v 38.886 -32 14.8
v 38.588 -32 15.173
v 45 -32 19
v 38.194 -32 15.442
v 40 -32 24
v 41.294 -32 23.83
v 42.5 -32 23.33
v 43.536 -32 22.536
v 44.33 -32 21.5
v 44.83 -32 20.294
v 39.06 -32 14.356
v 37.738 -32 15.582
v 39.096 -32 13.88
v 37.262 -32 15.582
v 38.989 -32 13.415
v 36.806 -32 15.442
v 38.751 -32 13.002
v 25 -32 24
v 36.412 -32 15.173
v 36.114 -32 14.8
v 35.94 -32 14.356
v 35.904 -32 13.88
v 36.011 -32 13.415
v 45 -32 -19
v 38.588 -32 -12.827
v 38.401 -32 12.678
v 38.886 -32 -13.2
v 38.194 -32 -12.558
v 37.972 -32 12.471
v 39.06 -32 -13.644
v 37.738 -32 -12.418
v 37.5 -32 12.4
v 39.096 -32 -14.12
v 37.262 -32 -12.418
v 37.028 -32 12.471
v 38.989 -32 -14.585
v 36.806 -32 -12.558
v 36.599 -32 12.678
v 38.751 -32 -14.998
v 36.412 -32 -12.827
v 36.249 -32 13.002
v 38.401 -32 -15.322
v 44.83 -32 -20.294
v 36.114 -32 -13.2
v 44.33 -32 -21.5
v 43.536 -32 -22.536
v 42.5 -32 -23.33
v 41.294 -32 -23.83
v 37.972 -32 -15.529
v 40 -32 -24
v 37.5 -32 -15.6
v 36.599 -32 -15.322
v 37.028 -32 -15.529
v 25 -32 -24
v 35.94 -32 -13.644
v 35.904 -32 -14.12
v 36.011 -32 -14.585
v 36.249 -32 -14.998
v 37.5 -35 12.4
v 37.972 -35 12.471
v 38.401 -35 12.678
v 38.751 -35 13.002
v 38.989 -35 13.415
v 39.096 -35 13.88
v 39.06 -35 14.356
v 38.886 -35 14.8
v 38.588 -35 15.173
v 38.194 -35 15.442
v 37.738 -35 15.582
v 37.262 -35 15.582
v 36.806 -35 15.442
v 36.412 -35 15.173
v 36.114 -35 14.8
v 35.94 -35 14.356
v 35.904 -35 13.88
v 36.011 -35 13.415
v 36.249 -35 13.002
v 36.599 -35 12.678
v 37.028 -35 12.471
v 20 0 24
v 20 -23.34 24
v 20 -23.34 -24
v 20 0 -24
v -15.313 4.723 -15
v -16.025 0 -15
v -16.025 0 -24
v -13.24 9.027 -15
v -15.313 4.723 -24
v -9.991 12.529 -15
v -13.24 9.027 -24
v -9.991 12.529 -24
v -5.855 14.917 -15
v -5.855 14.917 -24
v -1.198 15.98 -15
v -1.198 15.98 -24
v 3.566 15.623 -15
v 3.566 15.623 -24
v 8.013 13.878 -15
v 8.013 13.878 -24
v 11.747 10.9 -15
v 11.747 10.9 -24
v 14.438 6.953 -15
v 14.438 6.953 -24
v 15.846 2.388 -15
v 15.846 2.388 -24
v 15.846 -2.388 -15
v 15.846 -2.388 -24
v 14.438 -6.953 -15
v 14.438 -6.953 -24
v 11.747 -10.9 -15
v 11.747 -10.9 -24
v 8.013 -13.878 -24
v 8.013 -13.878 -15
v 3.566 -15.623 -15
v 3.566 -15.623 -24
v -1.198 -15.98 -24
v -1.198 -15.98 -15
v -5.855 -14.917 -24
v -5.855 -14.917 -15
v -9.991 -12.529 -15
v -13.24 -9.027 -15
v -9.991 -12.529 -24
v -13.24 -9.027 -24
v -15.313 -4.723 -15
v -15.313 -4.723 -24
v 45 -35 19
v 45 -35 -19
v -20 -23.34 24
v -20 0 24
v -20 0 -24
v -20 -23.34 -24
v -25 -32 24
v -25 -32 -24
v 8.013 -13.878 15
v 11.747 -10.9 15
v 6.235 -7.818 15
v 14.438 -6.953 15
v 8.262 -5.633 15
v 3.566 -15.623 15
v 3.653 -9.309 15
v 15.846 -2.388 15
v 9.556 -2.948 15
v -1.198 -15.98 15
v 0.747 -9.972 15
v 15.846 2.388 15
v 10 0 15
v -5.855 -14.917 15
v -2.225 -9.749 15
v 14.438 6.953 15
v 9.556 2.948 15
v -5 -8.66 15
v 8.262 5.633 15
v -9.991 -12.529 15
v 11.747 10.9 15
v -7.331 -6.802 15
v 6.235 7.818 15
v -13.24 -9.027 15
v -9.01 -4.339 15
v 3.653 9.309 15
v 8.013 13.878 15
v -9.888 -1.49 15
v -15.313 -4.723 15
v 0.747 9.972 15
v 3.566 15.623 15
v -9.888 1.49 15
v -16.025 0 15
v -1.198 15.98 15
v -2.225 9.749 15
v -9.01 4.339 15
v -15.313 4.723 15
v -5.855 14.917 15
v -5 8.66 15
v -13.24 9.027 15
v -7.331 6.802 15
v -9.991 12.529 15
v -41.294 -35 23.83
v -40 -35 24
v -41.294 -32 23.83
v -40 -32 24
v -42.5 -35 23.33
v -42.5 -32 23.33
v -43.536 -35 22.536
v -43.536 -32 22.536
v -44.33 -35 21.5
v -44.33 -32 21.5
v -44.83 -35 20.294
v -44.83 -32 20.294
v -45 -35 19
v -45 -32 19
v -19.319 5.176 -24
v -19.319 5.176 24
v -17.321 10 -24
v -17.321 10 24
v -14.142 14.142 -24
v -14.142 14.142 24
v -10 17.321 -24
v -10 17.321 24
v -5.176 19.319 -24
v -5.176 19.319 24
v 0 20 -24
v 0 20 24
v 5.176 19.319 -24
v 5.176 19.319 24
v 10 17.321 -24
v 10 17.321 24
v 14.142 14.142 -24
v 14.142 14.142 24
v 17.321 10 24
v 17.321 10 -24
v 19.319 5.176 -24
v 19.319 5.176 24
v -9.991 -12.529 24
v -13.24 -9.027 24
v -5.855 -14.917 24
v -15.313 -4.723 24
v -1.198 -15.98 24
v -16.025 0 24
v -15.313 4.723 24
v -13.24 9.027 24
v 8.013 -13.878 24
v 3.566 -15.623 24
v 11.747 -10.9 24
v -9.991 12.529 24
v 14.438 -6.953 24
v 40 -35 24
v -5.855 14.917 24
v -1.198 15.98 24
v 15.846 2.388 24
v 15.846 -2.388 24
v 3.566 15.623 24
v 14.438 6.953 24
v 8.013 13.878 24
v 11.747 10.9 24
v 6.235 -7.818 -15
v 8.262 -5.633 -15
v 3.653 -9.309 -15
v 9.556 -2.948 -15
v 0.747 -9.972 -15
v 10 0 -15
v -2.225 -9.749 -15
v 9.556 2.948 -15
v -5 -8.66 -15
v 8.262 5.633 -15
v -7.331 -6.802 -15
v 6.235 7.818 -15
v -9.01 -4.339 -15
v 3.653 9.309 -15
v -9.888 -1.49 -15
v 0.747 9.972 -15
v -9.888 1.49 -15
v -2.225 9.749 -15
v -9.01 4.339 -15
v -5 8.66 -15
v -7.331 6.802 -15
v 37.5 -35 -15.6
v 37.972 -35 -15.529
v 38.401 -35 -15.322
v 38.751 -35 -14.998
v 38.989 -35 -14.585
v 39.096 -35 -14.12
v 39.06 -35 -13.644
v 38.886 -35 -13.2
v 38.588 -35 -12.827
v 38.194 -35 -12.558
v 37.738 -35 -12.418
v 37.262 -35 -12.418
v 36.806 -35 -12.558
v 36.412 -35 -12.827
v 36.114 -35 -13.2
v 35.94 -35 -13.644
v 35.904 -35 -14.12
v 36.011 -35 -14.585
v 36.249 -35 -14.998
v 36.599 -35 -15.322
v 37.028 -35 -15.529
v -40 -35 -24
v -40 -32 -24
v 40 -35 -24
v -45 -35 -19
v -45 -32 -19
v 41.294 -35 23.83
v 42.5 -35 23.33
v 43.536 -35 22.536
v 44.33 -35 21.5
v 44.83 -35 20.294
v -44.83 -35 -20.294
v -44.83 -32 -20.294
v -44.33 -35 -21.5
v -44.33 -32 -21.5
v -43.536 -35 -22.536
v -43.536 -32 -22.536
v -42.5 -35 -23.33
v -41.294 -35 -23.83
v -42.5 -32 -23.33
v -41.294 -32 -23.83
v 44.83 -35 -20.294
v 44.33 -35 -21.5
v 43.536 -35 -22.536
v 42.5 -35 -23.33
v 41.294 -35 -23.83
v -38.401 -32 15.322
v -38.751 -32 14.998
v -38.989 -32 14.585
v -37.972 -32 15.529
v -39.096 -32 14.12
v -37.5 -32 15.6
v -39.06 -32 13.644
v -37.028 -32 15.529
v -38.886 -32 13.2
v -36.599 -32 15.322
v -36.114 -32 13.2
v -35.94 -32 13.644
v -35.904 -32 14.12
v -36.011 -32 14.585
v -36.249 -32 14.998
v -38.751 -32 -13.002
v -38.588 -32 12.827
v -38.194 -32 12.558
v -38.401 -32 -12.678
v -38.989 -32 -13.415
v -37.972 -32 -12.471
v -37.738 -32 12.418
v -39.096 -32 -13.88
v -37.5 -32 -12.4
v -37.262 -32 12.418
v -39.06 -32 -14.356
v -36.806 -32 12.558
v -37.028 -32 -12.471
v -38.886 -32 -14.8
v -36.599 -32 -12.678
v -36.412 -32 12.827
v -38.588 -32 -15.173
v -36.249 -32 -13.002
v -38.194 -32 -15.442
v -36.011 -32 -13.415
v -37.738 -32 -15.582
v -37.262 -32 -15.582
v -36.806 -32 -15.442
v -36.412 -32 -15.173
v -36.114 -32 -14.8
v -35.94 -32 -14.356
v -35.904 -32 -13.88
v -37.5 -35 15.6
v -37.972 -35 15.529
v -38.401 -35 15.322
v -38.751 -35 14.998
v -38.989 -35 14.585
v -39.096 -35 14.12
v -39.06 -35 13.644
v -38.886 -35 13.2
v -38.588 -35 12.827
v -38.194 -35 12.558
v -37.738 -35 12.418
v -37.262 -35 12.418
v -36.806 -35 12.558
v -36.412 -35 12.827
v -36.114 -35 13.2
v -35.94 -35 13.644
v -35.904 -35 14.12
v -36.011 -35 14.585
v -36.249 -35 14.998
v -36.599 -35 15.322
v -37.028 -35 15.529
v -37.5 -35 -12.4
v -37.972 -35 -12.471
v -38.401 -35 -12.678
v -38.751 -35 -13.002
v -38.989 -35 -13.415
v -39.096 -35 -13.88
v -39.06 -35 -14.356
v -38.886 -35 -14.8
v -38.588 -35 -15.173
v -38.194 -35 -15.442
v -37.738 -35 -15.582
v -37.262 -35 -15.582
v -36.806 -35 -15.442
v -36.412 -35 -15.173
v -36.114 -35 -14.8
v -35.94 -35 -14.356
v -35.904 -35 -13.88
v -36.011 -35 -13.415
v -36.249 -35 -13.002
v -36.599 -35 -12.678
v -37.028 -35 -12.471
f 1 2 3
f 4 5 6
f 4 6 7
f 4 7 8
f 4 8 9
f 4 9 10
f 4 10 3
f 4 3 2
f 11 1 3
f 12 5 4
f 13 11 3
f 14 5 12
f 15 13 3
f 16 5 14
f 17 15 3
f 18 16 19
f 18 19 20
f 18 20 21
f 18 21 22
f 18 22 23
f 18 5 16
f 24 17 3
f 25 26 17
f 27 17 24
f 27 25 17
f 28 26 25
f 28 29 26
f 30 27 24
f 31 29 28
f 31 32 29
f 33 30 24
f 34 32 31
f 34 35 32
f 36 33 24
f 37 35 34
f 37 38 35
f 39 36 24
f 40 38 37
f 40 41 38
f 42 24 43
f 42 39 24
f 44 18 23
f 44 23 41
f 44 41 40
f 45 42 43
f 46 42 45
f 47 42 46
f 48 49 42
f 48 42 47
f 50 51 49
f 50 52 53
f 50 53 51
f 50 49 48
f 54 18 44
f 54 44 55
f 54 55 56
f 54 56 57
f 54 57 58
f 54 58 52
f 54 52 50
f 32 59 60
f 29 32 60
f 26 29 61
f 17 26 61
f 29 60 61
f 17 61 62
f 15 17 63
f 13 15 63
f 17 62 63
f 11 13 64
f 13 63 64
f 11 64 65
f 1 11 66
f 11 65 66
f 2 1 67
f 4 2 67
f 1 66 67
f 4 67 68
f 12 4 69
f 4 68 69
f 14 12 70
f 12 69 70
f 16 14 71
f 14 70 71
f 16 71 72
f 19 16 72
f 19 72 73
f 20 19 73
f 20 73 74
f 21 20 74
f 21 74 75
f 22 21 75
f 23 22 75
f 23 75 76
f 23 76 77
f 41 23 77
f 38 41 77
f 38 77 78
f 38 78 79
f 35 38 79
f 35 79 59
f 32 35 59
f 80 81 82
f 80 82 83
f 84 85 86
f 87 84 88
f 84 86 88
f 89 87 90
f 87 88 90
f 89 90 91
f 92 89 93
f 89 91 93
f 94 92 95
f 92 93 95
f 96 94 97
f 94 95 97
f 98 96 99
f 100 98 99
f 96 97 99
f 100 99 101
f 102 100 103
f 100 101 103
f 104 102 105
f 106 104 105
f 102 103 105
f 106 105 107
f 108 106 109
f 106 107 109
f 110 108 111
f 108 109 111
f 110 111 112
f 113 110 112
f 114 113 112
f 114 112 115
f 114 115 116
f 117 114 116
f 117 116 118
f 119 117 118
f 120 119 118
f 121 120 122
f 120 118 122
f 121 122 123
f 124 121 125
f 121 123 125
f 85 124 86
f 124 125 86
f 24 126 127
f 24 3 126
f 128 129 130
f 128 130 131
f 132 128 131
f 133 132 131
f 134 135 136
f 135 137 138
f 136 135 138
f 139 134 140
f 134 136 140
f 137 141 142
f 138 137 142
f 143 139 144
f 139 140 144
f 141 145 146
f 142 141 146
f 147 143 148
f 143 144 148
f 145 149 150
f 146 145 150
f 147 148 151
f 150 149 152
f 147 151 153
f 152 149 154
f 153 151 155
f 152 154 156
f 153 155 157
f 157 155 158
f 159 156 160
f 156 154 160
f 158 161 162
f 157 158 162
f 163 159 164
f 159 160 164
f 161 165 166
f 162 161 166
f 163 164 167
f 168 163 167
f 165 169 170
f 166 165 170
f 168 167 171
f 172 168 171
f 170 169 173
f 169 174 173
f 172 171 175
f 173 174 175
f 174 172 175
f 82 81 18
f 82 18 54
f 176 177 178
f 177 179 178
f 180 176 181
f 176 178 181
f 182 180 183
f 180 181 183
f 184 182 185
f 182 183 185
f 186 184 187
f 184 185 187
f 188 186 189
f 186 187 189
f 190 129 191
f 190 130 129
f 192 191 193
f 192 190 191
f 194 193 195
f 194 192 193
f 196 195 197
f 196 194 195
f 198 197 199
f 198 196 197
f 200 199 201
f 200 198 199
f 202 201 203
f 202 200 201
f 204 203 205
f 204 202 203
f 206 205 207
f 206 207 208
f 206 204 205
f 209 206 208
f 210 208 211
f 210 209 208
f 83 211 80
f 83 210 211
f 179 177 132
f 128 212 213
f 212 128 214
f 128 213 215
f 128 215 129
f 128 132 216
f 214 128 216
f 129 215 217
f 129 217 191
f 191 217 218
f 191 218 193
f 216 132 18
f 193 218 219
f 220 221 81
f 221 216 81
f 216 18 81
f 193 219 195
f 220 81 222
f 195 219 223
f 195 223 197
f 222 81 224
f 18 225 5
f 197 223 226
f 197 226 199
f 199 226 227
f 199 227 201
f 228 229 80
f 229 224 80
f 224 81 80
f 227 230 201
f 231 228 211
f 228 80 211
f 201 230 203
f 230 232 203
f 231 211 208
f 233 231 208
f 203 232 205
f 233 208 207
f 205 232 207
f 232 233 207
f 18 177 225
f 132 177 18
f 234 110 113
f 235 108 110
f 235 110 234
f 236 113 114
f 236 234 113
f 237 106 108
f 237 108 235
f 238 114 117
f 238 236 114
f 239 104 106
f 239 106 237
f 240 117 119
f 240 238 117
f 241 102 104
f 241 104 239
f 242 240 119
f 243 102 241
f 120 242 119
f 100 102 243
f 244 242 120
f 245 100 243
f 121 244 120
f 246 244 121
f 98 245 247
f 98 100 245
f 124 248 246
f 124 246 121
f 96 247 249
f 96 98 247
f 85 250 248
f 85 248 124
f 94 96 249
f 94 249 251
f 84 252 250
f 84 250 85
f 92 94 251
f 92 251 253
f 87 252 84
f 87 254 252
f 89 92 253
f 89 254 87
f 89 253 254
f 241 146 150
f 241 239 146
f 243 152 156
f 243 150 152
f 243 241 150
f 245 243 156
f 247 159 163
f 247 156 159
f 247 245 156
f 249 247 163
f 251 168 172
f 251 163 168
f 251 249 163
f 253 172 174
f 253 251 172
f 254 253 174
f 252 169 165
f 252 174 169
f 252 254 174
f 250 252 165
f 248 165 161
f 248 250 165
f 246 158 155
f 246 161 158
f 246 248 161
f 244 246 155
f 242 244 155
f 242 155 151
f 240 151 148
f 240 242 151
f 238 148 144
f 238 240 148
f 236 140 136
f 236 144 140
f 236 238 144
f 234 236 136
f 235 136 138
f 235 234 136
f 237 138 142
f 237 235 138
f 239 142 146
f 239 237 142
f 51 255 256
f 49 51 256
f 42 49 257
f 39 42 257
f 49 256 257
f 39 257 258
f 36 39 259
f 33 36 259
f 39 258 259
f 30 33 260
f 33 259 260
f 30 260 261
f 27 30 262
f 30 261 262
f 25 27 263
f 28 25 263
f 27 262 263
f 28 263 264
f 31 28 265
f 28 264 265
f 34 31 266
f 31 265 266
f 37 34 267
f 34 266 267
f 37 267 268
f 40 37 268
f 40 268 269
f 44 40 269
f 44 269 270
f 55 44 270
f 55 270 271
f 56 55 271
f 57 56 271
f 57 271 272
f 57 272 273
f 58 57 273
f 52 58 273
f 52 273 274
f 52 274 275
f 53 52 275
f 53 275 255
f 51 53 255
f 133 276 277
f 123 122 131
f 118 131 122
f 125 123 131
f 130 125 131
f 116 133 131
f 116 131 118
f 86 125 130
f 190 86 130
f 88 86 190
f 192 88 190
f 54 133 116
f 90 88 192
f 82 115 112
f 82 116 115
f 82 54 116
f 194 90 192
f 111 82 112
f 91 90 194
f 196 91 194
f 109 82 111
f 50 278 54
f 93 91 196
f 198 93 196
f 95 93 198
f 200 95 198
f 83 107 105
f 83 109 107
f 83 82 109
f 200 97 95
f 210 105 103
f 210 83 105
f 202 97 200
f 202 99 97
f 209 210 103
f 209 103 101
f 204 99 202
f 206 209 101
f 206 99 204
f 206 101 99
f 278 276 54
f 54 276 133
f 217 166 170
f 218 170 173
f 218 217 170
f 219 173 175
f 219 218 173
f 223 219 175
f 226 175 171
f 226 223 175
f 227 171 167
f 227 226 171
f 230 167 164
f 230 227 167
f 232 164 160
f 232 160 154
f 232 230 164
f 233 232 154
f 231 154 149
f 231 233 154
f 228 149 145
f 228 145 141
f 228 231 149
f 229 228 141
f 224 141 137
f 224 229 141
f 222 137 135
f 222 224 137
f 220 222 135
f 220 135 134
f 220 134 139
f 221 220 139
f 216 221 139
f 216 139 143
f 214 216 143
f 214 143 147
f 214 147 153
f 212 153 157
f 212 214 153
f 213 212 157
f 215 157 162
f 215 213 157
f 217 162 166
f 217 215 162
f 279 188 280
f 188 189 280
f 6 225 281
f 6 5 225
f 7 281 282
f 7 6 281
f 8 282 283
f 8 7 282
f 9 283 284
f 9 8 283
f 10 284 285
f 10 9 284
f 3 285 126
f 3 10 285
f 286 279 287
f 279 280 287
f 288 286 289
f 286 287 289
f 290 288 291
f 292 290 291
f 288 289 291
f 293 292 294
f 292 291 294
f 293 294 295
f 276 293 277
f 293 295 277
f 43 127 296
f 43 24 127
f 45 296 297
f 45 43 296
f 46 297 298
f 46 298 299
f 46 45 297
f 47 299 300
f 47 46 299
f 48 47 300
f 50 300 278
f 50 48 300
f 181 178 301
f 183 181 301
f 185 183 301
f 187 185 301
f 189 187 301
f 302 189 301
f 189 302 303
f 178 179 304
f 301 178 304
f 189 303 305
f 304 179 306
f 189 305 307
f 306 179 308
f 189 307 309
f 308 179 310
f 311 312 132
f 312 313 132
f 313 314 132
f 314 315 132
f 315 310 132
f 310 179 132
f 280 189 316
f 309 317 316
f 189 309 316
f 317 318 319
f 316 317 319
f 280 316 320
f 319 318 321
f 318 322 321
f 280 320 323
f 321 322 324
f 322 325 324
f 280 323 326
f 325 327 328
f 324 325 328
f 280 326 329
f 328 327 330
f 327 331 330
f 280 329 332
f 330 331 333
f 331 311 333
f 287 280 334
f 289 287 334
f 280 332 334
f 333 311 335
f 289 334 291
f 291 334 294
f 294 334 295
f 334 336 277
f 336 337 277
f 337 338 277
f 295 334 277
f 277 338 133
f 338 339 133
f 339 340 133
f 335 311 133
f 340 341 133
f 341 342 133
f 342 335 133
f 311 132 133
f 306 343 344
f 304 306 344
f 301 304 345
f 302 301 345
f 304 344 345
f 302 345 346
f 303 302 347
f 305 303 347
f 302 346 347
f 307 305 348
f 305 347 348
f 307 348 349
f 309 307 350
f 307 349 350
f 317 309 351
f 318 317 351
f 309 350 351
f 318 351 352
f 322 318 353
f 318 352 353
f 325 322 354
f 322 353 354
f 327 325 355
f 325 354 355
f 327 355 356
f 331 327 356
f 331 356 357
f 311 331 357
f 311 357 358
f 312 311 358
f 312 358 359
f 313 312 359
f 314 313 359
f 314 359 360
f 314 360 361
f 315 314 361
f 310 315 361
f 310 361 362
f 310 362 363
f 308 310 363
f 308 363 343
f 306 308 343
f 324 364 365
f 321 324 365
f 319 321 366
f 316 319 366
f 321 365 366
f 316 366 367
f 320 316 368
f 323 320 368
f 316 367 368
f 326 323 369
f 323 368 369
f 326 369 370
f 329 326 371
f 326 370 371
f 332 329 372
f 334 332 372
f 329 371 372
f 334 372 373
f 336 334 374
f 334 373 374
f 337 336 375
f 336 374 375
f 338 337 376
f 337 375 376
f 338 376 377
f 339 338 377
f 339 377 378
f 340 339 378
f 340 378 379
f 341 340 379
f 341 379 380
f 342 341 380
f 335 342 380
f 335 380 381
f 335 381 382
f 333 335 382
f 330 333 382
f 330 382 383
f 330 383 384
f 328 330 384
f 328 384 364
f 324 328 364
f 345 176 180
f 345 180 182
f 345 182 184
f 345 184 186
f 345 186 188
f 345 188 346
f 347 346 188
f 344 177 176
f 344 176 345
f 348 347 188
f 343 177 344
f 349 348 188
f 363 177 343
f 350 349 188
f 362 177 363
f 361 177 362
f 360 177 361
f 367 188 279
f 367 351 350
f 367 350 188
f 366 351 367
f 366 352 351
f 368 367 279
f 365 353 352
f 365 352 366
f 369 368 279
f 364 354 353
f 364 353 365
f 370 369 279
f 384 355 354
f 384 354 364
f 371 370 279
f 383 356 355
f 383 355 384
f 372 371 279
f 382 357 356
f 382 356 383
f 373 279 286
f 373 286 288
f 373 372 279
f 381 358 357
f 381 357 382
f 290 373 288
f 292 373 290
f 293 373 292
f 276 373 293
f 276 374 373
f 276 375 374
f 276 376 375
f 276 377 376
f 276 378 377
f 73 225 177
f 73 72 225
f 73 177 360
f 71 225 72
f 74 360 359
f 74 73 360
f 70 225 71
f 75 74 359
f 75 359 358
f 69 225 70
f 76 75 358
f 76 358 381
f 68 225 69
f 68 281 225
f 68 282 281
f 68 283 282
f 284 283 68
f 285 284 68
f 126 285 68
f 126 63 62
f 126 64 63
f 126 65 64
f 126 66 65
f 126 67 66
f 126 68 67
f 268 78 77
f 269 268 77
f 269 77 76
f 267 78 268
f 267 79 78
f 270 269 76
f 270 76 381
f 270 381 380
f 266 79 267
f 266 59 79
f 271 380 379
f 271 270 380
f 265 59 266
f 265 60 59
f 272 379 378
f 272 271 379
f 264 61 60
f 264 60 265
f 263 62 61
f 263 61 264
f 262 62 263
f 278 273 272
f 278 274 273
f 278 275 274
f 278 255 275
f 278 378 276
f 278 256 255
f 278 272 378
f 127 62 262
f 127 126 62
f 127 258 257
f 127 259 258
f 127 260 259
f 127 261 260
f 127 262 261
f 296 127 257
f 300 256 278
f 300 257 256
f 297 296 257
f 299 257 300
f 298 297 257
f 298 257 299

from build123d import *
from OCP.BRepFilletAPI import BRepFilletAPI_MakeChamfer

# Parameters (mm, degrees)
SKETCH_1_R          = 10
EXTRUDE_1_DEPTH     = 24
SKETCH_4_R          = 16.025
CUT_EXTRUDE_3_DEPTH = 9
SKETCH_5_W          = 48
SKETCH_5_H          = 3
EXTRUDE_2_DEPTH     = 25
CHAMFER_1_SIZE      = 5
CHAMFER_1_SIZE2     = 8.660254038
SKETCH_7_R          = 1.6
CUT_EXTRUDE_4_DEPTH = 76.00666637
FILLET_1_R          = 20
FILLET_2_R          = 5


with BuildPart() as part:
    # 草图1 → 凸台-拉伸1 (new, symmetric)
    with BuildSketch(Plane.XY):
        Polygon((-20, -35), (-20, 0), (-20, 20), (20, 20), (20, 0), (20, -35), align=None)
        Circle(SKETCH_1_R, mode=Mode.SUBTRACT)
    extrude(amount=EXTRUDE_1_DEPTH, both=True)

    # 草图4 → 切除-拉伸3 (cut)
    with BuildSketch(Plane(origin=(0, 0, -24), x_dir=(-1, 0, 0), z_dir=(0, 0, -1))):
        Circle(SKETCH_4_R)
    cut_extrude_3 = extrude(amount=-CUT_EXTRUDE_3_DEPTH, mode=Mode.SUBTRACT)

    # 镜向1: 切除-拉伸3 across plane
    add(cut_extrude_3.mirror(Plane.XY), mode=Mode.SUBTRACT)

    # 草图5 → 凸台-拉伸2 (add)
    with BuildSketch(Plane(origin=(20, 0, 0), x_dir=(0, 0, -1), z_dir=(1, 0, 0))):
        with Locations((0, -33.5)):
            Rectangle(SKETCH_5_W, SKETCH_5_H)
    extrude_2 = extrude(amount=EXTRUDE_2_DEPTH)

    # 镜向2: 凸台-拉伸2 across plane
    add(extrude_2.mirror(Plane.ZY))

    # 倒角1: one chamfer whose edges measure the first distance from different faces: ONE call of the kernel's chamfer builder (chamfer() names one face for all edges)
    chamfer_1_edges_1 = [part.edges().sort_by_distance(p)[0] for p in [
        (20, -32, 0),
    ]]
    chamfer_1_side_1 = [part.faces().sort_by_distance(p)[0] for p in [
        (32.5, -32, 0),
    ]]
    chamfer_1_edges_2 = [part.edges().sort_by_distance(p)[0] for p in [
        (-20, -32, 0),
    ]]
    chamfer_1_side_2 = [part.faces().sort_by_distance(p)[0] for p in [
        (-32.5, -32, 0),
    ]]
    chamfer_1 = BRepFilletAPI_MakeChamfer(part.part.solid().wrapped)
    for e in chamfer_1_edges_1:
        chamfer_1.Add(CHAMFER_1_SIZE, CHAMFER_1_SIZE2, e.wrapped, chamfer_1_side_1[0].wrapped)  # the first distance lies on this face
    for e in chamfer_1_edges_2:
        chamfer_1.Add(CHAMFER_1_SIZE, CHAMFER_1_SIZE2, e.wrapped, chamfer_1_side_2[0].wrapped)  # the first distance lies on this face
    add(Compound.cast(chamfer_1.Shape()), mode=Mode.REPLACE)

    # 草图7 → 切除-拉伸4 (cut, through all)
    with BuildSketch(Plane.XZ.offset(35)):
        with Locations(Location((37.5, 14, 0), (0, 0, 270))):
            Circle(SKETCH_7_R)
        with Locations(Location((37.5, -14, 0), (0, 0, 270))):
            Circle(SKETCH_7_R)
        with Locations(Location((-37.5, 14, 0), (0, 0, 90))):
            Circle(SKETCH_7_R)
        with Locations(Location((-37.5, -14, 0), (0, 0, 90))):
            Circle(SKETCH_7_R)
    extrude(amount=-CUT_EXTRUDE_4_DEPTH, mode=Mode.SUBTRACT)

    # 圆角1
    fillet_1_edges = [part.edges().sort_by_distance(p)[0] for p in [
        (20, 20, 0),
        (-20, 20, 0),
    ]]
    fillet(fillet_1_edges, radius=FILLET_1_R - 0.0001)  # a hair under: the kernel refuses the full size

    # 圆角2
    fillet_2_edges = [part.edges().sort_by_distance(p)[0] for p in [
        (45, -33.5, 24),
        (45, -33.5, -24),
        (-45, -33.5, 24),
        (-45, -33.5, -24),
    ]]
    fillet(fillet_2_edges, radius=FILLET_2_R)


solid = part.part
